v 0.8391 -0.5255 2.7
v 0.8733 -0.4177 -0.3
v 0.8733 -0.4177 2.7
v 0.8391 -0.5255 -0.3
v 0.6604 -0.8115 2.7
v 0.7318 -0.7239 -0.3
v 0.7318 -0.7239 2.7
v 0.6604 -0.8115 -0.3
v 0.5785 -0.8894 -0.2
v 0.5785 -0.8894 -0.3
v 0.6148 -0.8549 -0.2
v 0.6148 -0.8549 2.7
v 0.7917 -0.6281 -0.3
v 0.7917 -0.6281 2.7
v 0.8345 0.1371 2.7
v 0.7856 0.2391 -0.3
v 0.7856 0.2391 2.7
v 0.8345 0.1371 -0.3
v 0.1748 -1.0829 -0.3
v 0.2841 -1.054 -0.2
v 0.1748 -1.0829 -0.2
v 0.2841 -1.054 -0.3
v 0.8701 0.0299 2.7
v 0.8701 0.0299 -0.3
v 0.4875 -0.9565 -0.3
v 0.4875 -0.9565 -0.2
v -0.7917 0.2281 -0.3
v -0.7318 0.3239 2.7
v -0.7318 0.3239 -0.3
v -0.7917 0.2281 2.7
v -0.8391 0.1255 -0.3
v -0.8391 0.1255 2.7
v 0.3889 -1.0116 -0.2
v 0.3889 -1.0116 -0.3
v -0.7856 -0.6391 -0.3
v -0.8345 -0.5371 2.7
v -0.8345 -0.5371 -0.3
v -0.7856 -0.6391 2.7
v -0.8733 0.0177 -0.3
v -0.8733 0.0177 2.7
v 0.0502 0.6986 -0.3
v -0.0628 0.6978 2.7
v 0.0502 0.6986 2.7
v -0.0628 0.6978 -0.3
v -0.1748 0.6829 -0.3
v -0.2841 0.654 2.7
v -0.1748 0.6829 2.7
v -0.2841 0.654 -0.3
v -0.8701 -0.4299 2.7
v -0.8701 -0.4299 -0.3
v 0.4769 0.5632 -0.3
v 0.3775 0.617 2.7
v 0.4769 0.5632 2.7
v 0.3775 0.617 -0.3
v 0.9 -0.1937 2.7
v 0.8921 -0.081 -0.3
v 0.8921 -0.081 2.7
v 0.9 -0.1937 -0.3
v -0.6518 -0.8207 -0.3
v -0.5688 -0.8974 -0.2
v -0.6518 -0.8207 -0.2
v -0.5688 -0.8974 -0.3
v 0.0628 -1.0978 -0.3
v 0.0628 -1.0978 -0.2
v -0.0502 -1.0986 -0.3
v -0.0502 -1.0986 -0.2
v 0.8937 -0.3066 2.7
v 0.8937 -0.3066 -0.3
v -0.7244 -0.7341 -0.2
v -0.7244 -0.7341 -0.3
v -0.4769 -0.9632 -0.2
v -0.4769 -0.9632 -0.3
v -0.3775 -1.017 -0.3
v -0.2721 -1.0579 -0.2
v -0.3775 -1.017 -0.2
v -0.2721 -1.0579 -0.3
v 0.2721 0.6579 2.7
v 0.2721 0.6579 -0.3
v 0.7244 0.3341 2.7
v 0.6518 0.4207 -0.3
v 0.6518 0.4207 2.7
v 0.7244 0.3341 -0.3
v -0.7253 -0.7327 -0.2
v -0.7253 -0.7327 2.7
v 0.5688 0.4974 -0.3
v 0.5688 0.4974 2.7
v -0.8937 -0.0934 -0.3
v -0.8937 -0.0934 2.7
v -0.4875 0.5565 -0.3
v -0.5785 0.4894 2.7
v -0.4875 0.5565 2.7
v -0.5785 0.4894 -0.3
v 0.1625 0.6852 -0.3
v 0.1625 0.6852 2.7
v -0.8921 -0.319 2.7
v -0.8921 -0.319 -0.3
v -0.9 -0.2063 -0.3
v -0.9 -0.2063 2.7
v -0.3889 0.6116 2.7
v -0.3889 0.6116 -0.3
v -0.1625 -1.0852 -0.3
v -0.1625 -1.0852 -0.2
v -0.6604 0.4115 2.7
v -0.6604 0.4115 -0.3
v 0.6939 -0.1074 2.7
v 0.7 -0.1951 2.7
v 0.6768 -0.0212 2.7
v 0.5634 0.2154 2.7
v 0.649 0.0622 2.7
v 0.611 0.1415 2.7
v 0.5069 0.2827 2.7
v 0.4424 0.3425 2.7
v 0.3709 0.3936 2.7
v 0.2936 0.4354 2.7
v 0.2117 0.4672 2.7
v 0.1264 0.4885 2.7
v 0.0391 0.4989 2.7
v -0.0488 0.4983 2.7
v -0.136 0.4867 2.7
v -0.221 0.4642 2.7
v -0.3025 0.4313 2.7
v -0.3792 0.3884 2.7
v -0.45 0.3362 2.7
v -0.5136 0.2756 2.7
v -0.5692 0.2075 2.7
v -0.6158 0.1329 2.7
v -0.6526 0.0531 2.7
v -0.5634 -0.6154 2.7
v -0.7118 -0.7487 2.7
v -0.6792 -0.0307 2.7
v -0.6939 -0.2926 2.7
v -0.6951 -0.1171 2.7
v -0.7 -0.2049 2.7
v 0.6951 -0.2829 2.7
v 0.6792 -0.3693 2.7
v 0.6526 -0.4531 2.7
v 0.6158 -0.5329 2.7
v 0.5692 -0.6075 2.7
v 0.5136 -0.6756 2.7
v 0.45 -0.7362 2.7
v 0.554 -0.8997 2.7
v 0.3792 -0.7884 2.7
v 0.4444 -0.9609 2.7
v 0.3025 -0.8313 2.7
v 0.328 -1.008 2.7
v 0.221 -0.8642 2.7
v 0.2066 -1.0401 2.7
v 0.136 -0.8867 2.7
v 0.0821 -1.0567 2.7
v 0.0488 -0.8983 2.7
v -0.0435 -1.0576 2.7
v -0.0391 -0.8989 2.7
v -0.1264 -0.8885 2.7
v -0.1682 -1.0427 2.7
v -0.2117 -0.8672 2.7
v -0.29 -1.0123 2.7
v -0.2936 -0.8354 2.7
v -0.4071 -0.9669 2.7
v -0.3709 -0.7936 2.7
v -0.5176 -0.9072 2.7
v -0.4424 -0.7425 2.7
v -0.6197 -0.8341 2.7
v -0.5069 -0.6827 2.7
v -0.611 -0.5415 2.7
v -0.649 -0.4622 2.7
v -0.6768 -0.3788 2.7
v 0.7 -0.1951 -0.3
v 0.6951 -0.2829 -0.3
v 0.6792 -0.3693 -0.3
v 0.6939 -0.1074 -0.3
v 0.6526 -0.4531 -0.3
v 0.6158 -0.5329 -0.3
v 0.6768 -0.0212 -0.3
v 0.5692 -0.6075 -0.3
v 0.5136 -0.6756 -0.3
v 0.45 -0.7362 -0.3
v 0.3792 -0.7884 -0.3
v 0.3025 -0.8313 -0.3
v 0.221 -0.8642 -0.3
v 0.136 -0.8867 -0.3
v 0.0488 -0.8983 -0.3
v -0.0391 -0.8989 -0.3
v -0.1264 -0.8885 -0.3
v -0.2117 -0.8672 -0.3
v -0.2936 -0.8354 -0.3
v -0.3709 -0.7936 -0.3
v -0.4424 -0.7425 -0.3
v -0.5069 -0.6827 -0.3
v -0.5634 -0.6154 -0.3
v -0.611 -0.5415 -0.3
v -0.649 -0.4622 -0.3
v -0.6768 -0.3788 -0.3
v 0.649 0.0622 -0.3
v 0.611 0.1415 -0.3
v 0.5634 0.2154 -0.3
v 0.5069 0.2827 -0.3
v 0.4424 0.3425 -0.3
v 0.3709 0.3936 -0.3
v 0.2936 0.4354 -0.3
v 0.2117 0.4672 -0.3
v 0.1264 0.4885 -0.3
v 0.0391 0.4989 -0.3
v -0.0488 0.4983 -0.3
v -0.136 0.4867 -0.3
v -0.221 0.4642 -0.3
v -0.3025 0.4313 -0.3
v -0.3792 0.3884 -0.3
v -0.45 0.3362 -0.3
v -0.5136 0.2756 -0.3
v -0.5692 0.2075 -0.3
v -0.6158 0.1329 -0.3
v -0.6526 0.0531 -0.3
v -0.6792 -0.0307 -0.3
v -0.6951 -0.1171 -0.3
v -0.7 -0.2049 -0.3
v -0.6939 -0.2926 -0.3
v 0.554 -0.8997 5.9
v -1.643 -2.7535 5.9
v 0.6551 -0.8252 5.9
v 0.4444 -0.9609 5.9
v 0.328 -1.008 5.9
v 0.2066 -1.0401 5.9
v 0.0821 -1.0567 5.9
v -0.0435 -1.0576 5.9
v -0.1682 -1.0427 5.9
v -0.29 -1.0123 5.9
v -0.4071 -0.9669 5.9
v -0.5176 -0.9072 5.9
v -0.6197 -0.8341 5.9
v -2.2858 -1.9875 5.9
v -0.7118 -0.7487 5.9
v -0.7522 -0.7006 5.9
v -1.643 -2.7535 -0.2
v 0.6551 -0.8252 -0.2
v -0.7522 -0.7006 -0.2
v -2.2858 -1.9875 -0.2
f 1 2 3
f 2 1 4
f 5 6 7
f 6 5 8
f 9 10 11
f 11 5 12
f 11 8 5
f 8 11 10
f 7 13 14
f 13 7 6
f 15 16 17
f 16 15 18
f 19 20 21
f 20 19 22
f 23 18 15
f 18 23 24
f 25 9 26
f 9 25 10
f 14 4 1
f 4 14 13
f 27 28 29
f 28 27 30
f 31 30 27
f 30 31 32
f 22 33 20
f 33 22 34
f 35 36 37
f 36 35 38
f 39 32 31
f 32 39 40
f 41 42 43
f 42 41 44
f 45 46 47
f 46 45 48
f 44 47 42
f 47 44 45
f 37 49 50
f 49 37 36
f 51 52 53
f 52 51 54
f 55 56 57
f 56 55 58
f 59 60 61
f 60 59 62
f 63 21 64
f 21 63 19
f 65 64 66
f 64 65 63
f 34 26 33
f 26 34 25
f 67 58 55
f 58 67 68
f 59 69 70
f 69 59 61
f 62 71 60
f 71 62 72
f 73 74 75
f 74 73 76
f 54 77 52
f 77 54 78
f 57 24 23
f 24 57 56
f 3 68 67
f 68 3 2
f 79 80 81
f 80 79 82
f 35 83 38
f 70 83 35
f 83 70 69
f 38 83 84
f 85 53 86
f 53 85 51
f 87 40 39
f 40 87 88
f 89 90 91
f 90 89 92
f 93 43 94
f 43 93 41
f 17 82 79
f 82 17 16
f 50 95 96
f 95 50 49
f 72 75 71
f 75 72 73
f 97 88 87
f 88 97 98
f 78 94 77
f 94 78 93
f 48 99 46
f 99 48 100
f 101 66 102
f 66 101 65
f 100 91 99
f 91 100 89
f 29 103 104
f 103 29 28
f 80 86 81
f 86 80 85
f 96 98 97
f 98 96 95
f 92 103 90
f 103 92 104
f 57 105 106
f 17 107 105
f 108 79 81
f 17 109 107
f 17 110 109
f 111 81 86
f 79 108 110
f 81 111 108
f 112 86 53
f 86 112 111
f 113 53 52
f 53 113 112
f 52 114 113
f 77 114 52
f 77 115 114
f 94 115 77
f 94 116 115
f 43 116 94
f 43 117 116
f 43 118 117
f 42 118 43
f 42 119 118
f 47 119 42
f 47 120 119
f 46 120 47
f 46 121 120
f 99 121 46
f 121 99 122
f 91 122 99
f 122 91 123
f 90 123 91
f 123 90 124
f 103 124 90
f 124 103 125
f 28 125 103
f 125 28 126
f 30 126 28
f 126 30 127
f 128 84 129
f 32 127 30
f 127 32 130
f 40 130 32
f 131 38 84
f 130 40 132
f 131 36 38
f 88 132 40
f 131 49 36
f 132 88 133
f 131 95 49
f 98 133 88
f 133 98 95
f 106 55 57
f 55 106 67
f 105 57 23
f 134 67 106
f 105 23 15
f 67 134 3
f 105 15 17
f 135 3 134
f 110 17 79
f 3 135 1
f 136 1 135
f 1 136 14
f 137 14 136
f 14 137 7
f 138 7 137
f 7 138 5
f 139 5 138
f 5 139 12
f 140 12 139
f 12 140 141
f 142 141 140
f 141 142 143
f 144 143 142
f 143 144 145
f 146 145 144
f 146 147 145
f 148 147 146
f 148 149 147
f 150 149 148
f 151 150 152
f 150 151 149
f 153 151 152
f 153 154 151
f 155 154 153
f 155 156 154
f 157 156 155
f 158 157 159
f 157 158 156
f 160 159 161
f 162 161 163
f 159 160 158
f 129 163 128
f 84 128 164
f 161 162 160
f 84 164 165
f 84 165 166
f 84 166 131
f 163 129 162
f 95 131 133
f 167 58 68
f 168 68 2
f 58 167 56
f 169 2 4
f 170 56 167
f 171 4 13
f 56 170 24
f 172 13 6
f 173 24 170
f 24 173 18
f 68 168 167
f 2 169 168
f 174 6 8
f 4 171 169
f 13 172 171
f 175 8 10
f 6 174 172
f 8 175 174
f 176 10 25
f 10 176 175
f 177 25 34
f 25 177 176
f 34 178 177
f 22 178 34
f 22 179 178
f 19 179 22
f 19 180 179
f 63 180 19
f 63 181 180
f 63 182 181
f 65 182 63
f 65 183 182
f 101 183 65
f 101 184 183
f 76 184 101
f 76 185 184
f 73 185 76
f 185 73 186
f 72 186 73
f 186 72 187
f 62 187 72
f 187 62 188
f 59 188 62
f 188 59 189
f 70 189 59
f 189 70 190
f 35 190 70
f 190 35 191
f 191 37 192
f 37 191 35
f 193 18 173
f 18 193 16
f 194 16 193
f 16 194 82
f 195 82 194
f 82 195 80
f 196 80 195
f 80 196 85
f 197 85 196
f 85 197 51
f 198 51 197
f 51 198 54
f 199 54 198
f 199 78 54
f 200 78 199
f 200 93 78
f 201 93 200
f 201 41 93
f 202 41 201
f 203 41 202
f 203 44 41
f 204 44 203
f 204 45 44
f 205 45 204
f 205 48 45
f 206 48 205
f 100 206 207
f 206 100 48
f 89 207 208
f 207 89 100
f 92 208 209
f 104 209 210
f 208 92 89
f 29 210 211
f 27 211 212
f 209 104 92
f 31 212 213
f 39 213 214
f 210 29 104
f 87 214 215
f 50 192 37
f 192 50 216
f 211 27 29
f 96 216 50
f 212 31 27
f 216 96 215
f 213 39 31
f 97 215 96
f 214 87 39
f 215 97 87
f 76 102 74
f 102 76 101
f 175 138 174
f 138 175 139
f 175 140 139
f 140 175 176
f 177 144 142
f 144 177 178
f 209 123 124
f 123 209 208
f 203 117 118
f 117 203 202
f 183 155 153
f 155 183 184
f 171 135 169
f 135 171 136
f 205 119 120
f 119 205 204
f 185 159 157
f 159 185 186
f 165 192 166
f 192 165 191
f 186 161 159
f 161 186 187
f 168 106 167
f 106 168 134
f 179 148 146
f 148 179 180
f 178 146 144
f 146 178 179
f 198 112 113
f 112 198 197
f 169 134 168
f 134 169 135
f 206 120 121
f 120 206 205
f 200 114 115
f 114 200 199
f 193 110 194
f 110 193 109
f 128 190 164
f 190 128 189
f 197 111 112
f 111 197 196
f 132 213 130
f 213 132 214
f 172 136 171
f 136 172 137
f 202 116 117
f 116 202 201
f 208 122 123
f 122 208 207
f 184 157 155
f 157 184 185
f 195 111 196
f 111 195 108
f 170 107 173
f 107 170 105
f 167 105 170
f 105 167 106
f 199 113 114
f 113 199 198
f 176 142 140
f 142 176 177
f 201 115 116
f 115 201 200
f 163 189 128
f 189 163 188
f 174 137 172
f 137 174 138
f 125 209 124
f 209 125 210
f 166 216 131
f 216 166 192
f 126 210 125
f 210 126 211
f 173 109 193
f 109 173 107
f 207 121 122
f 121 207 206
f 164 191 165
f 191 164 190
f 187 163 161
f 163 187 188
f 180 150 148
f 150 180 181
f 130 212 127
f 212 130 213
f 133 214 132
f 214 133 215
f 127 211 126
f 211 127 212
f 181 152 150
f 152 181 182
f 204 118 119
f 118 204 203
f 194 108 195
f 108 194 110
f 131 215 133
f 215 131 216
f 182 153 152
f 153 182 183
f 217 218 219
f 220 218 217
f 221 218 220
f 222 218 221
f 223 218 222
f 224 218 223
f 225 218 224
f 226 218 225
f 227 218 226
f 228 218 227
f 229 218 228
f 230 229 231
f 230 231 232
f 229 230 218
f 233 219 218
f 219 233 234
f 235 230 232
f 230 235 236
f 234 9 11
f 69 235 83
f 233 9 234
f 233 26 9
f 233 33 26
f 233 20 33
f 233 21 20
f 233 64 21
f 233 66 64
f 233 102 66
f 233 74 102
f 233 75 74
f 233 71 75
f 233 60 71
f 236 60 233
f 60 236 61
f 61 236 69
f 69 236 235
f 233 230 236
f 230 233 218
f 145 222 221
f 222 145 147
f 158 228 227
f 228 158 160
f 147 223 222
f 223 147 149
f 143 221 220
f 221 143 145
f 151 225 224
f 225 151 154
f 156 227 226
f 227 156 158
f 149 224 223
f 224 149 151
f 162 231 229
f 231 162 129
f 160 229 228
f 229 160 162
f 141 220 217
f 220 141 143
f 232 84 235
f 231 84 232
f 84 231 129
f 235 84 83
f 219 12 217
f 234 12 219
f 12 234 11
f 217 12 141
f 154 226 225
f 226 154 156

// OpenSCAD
module block_long() { //long block
	difference(){
		cube([6.6, 3, 1]);
		
		translate([-1,0,0])
			rotate([0,270,180])
			cylinder(h=8, r=1, $fn=50);
	}
}

module block_short() { //long block
	difference(){
		cube([6.1,3,1]);
		
		translate([-1,0,0])
			rotate([0,270,180])
			cylinder(h=8, r=1, $fn=50);
	}
}

module cylinder_bottom(){
	difference(){
		cylinder(h=3, r=0.9, $fn=50);

		translate([0,0,-1])
			cylinder(h=8, r=0.7, $fn=50);
	}

	translate([-.1, .1, .1])
	rotate([0,270,180])
		block_short();
}

module cylinder_top(){

	translate([0,0,3])
		cylinder(h=3, r=1, $fn=50);
	translate([0,0,-.4]) //innder dowel
		cylinder(h=6.4, r=.5, $fn=50);

	translate([0, 0, 6])
		rotate([0,90,0])
			block_long();
	translate([0,0,-.6])

	cylinder(h=.2, r=1, $fn=50);
}

color("blue")
translate([0,-.2,-0.3])
	rotate([0,0, -50])
	cylinder_bottom();


%cylinder_top();
